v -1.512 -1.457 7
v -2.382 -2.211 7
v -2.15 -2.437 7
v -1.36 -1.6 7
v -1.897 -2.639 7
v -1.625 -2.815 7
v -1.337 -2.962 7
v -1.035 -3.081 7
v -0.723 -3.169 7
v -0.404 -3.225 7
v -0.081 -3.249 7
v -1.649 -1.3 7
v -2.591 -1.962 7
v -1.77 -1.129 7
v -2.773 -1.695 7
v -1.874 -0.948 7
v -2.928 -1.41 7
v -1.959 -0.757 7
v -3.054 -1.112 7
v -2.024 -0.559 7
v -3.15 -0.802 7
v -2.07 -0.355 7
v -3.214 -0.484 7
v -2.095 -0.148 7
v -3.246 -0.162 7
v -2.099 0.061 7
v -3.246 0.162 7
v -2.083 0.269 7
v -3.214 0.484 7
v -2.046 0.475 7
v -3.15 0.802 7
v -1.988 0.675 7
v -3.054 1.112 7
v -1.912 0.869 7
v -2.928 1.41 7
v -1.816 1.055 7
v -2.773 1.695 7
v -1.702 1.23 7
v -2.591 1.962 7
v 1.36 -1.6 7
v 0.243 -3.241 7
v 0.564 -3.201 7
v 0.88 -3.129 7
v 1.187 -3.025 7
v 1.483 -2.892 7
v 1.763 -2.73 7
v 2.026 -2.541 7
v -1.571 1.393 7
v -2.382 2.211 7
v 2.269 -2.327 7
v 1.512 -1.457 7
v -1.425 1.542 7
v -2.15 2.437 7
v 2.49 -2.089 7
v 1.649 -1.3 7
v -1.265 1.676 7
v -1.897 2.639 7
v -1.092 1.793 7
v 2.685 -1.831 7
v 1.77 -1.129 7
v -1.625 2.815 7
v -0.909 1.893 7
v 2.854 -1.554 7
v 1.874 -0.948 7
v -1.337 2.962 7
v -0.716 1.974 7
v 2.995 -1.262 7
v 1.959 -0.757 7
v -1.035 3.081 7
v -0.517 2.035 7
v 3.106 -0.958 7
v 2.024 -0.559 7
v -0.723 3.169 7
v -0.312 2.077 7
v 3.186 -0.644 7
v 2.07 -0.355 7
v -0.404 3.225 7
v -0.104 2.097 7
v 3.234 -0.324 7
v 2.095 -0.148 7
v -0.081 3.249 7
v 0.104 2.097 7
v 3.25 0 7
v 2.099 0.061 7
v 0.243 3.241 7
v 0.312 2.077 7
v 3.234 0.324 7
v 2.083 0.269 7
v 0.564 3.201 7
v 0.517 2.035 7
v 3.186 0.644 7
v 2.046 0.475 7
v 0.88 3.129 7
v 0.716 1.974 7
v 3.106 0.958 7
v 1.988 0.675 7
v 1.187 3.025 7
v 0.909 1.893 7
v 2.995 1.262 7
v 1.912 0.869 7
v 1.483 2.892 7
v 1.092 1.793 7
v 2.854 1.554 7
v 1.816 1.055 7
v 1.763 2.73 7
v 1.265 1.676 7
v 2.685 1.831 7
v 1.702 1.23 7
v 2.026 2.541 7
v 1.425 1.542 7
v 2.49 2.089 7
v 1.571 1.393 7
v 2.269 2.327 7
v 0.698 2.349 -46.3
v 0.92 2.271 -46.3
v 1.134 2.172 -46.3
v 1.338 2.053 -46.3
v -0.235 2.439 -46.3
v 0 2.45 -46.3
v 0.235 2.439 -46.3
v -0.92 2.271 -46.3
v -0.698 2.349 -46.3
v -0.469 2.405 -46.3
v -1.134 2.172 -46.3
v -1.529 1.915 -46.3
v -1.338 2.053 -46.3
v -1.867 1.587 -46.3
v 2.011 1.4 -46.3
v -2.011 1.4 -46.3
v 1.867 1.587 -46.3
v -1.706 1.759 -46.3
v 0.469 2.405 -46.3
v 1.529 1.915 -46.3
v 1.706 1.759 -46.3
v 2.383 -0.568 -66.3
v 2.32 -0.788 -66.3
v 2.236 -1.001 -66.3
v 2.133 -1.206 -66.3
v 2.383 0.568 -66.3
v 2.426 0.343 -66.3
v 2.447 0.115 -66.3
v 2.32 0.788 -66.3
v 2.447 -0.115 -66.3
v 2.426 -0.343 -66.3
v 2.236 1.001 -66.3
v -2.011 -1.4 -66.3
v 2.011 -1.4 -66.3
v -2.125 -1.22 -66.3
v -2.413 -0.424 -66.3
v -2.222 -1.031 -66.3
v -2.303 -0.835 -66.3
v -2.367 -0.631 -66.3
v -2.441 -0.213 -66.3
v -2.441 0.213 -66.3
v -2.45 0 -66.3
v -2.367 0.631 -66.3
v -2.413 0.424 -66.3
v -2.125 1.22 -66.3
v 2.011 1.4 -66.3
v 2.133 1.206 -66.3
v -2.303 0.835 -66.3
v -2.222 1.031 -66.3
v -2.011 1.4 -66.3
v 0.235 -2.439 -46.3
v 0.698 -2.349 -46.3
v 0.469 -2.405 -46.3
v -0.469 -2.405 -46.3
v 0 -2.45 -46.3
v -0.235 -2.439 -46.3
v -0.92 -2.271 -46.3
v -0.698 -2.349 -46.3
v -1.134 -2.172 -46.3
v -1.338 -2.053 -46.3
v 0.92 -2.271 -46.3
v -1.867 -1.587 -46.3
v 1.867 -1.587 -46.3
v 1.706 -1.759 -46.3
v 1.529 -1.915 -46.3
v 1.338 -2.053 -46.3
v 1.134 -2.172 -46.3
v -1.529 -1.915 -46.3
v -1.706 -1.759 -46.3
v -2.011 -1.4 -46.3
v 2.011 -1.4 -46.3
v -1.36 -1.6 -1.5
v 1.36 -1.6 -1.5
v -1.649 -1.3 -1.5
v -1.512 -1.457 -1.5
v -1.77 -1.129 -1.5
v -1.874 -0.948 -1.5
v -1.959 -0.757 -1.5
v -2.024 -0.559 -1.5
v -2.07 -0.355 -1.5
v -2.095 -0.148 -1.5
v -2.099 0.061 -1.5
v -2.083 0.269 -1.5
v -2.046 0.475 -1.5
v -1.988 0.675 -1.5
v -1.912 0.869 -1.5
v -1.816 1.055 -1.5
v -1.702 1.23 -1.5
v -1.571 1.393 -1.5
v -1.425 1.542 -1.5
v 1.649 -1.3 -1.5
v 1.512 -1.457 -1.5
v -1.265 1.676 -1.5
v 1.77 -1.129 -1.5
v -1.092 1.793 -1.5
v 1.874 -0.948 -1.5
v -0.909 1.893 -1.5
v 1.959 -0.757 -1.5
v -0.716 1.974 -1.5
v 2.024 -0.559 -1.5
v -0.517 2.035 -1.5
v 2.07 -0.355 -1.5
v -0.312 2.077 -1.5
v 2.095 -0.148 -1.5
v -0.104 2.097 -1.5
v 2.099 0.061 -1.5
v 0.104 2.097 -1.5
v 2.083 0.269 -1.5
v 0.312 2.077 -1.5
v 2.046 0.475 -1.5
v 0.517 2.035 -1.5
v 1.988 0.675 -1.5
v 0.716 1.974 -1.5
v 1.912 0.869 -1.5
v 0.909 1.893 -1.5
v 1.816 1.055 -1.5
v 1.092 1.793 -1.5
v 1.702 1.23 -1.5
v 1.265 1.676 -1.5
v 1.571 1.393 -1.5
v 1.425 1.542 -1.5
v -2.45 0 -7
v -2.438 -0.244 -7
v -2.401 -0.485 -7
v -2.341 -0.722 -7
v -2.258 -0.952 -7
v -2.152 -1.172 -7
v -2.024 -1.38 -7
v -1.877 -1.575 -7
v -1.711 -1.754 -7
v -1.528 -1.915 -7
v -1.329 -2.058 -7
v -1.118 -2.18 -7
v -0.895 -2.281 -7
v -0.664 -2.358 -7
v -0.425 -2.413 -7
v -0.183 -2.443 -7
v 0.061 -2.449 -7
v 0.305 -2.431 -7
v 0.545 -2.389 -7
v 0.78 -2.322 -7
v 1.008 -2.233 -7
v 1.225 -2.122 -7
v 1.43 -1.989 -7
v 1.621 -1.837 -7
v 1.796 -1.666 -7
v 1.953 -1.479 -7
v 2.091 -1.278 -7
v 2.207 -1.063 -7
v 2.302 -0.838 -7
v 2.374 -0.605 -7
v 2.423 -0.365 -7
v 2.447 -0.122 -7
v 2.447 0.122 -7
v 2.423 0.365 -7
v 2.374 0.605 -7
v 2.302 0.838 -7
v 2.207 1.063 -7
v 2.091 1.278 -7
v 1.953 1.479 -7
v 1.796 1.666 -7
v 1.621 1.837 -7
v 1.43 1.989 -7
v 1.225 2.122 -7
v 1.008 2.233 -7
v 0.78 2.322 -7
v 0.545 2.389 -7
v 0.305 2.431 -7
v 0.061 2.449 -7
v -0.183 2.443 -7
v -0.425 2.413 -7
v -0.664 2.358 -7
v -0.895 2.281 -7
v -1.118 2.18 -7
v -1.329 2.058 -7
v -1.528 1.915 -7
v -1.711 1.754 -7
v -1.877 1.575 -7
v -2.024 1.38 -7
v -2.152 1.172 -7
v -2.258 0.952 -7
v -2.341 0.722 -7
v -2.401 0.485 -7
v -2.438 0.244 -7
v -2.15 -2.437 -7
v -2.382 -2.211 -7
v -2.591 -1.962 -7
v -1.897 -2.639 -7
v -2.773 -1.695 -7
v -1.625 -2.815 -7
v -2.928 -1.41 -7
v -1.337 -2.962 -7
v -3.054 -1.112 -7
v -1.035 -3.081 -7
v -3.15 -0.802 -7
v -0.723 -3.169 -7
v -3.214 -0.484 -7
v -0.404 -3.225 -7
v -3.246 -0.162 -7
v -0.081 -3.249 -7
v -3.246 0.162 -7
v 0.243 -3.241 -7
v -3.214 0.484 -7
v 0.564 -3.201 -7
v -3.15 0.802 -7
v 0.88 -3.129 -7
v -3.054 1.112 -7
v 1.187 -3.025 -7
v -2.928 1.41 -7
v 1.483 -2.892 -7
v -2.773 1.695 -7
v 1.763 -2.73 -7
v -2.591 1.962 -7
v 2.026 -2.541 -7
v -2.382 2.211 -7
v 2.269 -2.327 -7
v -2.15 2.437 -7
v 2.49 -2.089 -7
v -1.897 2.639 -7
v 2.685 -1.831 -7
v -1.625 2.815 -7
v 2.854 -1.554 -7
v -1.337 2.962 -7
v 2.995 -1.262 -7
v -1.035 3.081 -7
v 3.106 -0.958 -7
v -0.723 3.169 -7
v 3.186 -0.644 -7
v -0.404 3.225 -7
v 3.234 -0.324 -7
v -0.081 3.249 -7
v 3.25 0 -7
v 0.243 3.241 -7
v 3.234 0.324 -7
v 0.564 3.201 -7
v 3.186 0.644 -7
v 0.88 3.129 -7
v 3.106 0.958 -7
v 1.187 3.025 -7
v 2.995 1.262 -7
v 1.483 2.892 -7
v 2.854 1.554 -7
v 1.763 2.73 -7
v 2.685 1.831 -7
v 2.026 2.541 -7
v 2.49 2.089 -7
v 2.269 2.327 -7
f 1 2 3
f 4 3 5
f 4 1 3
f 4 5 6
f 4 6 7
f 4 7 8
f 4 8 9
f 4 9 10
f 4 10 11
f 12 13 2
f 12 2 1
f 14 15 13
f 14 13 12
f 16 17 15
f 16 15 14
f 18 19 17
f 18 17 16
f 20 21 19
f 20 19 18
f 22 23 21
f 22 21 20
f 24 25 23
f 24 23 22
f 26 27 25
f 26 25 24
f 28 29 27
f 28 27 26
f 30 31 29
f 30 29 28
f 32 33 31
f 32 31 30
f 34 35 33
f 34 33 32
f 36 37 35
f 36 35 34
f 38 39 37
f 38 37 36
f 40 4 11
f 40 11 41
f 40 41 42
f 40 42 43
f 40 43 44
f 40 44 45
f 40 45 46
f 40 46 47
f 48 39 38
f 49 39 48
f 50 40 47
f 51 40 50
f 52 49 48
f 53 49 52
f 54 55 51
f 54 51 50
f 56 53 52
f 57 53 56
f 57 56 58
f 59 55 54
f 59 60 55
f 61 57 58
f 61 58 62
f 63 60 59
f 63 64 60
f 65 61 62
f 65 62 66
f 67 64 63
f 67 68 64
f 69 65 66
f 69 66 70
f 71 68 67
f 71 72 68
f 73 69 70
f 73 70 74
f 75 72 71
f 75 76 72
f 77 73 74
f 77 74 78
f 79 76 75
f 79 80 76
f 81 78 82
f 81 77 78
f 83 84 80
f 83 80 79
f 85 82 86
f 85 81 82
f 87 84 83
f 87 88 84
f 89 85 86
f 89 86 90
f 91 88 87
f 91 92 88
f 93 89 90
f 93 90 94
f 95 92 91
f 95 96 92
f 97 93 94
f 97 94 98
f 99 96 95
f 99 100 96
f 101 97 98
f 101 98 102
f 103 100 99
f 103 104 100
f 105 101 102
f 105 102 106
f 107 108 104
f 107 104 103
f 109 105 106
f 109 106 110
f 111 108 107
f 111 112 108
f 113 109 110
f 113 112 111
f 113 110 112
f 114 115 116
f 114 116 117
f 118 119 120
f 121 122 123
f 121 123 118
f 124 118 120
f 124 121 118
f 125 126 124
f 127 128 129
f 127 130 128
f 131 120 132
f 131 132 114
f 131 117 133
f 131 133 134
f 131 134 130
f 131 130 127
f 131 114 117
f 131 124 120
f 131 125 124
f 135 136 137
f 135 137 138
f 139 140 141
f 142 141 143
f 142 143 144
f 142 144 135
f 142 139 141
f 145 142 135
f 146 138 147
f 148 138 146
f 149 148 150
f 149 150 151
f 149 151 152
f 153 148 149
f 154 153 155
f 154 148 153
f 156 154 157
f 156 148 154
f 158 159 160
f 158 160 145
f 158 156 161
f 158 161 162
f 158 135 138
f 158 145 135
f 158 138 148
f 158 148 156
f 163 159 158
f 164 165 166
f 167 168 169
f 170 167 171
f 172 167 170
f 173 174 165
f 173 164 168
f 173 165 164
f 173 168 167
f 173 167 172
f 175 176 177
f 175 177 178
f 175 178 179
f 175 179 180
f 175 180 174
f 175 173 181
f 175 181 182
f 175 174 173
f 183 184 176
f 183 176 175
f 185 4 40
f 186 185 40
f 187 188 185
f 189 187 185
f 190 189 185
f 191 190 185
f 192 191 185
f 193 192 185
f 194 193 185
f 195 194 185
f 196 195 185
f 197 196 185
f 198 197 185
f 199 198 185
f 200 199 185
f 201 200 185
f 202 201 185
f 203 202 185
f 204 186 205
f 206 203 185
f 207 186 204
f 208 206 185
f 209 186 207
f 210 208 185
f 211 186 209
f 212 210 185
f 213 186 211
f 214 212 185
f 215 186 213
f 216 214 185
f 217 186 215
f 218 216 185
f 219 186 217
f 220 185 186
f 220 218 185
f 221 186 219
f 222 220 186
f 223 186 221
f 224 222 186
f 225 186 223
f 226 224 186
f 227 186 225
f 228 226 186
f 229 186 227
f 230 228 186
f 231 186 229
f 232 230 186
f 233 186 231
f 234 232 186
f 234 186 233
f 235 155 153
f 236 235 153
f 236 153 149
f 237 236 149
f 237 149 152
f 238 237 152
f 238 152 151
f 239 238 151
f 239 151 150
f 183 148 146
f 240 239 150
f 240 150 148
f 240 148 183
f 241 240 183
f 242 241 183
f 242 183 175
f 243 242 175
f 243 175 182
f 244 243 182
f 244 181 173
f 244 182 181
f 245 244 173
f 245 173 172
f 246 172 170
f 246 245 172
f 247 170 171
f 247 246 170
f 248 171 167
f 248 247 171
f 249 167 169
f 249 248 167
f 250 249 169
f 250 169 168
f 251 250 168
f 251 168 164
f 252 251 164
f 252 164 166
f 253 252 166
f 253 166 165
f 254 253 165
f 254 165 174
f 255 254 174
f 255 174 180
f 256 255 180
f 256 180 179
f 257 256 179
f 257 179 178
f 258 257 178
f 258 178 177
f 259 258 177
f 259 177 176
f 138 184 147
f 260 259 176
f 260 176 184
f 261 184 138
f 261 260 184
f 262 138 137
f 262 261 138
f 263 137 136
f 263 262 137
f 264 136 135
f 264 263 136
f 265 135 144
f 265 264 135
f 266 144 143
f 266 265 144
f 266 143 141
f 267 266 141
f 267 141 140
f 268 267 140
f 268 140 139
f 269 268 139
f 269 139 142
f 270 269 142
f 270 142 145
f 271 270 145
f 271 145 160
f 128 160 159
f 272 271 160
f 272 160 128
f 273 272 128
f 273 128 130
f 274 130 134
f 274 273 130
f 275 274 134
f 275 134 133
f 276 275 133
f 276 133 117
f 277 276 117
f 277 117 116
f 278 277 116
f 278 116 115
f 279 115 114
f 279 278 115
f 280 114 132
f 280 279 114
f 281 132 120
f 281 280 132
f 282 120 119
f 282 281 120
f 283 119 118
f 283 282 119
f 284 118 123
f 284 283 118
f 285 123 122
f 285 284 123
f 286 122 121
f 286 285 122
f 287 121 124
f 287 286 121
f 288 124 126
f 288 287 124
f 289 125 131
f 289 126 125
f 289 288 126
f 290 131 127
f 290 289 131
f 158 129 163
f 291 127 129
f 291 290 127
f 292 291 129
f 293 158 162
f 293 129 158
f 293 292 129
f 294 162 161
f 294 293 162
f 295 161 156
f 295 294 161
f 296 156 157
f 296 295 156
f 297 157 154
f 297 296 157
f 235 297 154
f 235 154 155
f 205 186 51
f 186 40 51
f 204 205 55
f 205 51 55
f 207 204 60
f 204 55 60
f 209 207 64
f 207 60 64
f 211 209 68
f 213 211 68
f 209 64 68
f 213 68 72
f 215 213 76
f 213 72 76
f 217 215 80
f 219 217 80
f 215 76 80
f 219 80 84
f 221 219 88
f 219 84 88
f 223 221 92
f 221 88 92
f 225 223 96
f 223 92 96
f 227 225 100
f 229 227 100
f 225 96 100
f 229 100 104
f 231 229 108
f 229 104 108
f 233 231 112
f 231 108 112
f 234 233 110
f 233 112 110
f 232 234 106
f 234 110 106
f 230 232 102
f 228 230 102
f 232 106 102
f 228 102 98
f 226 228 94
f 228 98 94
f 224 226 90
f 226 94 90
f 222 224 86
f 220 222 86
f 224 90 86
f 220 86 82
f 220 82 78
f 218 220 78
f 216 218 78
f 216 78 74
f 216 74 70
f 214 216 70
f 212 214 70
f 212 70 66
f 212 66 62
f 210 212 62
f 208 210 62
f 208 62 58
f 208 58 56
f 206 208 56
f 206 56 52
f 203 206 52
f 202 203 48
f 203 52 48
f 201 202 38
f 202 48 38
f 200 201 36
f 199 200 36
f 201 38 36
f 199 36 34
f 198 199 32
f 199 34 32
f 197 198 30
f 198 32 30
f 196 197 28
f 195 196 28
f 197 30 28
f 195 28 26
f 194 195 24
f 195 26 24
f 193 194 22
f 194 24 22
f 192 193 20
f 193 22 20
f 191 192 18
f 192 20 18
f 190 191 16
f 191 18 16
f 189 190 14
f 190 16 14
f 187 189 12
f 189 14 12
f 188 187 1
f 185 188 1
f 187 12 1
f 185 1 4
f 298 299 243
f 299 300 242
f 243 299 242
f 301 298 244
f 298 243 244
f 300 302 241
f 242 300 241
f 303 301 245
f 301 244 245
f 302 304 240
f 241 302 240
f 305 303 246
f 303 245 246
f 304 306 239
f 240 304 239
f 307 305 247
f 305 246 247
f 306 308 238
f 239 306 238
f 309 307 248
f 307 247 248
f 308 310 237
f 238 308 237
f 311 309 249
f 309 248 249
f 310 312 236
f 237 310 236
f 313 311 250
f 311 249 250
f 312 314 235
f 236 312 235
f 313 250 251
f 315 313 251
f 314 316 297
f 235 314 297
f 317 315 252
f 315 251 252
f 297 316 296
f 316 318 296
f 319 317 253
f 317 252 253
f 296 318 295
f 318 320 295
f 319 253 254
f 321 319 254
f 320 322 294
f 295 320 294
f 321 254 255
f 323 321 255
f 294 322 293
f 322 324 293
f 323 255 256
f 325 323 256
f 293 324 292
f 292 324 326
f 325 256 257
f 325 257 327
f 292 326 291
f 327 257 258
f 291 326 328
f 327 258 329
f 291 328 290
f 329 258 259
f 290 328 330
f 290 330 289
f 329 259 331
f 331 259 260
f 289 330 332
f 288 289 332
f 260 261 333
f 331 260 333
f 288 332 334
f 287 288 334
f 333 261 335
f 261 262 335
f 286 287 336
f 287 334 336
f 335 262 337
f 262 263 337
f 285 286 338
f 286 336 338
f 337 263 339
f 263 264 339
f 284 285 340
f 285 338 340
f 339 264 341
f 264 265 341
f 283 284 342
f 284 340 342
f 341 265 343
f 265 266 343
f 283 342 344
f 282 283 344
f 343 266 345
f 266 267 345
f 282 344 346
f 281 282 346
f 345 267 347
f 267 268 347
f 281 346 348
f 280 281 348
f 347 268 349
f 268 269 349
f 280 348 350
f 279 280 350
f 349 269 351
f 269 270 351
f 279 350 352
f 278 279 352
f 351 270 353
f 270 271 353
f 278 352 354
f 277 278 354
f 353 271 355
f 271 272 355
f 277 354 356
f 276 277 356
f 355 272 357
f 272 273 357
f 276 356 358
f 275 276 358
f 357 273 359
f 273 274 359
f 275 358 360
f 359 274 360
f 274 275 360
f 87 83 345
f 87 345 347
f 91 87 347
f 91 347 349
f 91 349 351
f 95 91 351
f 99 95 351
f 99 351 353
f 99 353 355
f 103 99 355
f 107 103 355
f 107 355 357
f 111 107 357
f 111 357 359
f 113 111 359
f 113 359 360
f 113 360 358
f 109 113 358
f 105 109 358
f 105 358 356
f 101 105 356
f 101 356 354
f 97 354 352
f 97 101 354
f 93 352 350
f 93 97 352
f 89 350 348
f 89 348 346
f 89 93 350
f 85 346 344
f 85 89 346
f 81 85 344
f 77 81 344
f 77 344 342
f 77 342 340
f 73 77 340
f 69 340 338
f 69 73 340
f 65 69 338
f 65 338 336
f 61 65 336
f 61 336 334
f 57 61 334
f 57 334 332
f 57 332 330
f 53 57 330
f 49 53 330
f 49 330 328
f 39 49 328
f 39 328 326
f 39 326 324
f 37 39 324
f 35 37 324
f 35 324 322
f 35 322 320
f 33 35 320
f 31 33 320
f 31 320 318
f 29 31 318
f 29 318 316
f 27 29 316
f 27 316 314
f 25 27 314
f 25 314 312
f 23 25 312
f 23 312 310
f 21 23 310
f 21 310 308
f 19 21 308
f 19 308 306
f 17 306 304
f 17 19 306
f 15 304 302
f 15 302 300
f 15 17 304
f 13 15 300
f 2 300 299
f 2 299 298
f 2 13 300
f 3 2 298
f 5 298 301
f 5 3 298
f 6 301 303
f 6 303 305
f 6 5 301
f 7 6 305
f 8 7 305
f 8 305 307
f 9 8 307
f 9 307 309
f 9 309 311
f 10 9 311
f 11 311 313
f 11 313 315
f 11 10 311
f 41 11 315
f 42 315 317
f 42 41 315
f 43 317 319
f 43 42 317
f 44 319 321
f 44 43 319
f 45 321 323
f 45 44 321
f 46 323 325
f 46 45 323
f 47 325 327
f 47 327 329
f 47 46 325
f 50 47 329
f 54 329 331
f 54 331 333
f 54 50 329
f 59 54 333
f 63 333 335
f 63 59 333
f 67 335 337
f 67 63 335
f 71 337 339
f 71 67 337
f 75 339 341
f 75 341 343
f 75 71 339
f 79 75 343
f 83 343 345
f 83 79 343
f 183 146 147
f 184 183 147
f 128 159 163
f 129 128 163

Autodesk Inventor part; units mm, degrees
ref_plane "YZ Plane" through (0, 0, 0) normal (1, 0, 0) x (0, 1, 0)
ref_plane "XZ Plane" through (0, 0, 0) normal (0, 1, 0) x (-1, 0, 0)
ref_plane "XY Plane" through (0, 0, 0) normal (0, 0, 1) x (1, 0, 0)
sketch "Sketch1" plane through (0, 0, 0) normal (0, 0, 1) x (1, 0, 0)
  circle A0 centre (0, 0) radius 3.25
  dimension "d0" = 6.5
extrude "Extrusion1" add sketch "Sketch1" along normal mid plane 14
sketch "Sketch2" plane through (0, 0, 7) normal (0, 0, 1) x (1, 0, 0)
  arc A0 (1.3601, -1.6) -> (-1.3601, -1.6) centre (0, 0) ccw
  line L0 (-1.3601, -1.6) -> (1.3601, -1.6)
  point P0 (0, 2.2)
  point P1 (0, -1.65)
  point P2 (0, -1.6)
  point P3 (0, 2.1)
  dimension "d4" = 2.1
  dimension "d12" = 3.7
extrude "Extrusion2" cut sketch "Sketch2" against normal blind 8.5
sketch "Sketch3" plane through (0, 0, -7) normal (0, 0, -1) x (-1, 0, 0)
  circle A0 centre (0, 0) radius 2.45
  dimension "d9" = 4.9
extrude "Extrusion3" add sketch "Sketch3" along normal blind 39.3
sketch "Sketch4" plane through (0, 0, -46.3) normal (0, 0, -1) x (-1, 0, 0)
  circle A0 centre (0, 0) radius 2.45 projected
  arc A1 (-2.0106, 1.4) -> (-2.0106, -1.4) centre (0, 0) ccw
  arc A2 (2.0106, -1.4) -> (2.0106, 1.4) centre (0, 0) ccw
  line L0 (-2.0106, 1.4) -> (2.0106, 1.4)
  line L1 (2.0106, -1.4) -> (-2.0106, -1.4)
  dimension "d13" = 1.4
extrude "Extrusion4" add sketch "Sketch4" along normal blind 20 contours A0 L1 L0
properties part number "13042026-08"
